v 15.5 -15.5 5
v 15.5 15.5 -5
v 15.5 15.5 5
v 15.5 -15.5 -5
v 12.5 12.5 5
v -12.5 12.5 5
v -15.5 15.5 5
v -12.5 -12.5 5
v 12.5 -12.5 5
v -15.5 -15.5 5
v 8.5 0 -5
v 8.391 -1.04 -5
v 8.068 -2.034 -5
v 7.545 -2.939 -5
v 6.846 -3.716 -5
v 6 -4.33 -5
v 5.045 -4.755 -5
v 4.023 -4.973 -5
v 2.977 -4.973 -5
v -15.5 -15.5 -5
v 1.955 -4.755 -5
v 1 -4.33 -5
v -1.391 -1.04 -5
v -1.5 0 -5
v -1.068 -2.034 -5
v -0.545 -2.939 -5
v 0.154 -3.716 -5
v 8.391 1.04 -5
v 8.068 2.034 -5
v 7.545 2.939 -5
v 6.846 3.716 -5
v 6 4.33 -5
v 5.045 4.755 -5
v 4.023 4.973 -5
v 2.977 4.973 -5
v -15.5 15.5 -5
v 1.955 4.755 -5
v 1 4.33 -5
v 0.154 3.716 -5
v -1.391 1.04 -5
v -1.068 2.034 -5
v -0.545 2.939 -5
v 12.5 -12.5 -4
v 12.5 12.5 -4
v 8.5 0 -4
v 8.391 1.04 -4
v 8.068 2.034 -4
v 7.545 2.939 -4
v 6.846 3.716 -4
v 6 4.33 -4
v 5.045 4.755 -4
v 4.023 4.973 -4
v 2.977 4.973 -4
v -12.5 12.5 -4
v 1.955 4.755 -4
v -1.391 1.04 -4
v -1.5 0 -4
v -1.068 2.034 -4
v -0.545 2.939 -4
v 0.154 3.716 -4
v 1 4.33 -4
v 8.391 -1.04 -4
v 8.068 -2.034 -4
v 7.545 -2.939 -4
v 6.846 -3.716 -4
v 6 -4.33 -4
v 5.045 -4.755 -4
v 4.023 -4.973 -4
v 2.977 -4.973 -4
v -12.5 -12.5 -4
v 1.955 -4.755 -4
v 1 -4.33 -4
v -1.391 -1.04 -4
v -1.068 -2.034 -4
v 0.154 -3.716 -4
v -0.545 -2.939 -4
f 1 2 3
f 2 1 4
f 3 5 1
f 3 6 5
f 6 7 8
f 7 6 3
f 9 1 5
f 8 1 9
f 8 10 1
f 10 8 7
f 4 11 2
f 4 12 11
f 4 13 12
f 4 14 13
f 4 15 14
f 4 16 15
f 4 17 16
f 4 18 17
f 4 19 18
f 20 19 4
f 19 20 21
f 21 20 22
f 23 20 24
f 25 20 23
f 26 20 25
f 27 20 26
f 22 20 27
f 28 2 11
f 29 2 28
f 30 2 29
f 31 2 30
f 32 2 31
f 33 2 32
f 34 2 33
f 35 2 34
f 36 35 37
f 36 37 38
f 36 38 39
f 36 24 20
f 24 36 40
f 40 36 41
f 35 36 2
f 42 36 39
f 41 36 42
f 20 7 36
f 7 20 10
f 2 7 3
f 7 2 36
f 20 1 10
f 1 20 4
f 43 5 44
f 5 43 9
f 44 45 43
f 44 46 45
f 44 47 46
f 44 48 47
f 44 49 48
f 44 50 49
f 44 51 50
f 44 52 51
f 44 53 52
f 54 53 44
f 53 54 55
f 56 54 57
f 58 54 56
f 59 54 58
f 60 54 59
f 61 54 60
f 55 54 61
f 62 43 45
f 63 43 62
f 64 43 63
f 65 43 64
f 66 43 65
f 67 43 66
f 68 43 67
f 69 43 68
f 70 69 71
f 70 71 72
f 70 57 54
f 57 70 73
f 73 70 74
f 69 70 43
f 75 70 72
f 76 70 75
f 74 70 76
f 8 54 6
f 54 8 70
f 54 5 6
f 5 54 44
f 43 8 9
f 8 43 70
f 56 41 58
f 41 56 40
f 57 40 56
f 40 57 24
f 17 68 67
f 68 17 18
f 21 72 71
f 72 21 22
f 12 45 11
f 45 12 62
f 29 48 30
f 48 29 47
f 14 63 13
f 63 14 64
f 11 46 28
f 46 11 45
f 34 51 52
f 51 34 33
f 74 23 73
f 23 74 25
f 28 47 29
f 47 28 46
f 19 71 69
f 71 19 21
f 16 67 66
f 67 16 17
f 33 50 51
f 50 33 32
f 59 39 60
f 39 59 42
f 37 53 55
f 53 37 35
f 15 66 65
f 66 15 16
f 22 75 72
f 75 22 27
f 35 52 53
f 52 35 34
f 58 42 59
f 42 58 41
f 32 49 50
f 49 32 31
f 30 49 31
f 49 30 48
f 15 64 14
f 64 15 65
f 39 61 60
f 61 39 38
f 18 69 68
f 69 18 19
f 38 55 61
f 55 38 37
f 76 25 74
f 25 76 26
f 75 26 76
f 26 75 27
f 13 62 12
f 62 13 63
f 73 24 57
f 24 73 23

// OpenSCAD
$fn=30;
y_dim = 25;
x_dim = 25;

clearance = 1;
wall_thickness=1;

difference(){
cube([x_dim+6, y_dim+6, 10], center=true);
    translate([0,0,wall_thickness])
cube([x_dim, y_dim, 10], center=true);
    translate([3.5,0,0])
    cylinder(d=10, 50, center=true);
}
